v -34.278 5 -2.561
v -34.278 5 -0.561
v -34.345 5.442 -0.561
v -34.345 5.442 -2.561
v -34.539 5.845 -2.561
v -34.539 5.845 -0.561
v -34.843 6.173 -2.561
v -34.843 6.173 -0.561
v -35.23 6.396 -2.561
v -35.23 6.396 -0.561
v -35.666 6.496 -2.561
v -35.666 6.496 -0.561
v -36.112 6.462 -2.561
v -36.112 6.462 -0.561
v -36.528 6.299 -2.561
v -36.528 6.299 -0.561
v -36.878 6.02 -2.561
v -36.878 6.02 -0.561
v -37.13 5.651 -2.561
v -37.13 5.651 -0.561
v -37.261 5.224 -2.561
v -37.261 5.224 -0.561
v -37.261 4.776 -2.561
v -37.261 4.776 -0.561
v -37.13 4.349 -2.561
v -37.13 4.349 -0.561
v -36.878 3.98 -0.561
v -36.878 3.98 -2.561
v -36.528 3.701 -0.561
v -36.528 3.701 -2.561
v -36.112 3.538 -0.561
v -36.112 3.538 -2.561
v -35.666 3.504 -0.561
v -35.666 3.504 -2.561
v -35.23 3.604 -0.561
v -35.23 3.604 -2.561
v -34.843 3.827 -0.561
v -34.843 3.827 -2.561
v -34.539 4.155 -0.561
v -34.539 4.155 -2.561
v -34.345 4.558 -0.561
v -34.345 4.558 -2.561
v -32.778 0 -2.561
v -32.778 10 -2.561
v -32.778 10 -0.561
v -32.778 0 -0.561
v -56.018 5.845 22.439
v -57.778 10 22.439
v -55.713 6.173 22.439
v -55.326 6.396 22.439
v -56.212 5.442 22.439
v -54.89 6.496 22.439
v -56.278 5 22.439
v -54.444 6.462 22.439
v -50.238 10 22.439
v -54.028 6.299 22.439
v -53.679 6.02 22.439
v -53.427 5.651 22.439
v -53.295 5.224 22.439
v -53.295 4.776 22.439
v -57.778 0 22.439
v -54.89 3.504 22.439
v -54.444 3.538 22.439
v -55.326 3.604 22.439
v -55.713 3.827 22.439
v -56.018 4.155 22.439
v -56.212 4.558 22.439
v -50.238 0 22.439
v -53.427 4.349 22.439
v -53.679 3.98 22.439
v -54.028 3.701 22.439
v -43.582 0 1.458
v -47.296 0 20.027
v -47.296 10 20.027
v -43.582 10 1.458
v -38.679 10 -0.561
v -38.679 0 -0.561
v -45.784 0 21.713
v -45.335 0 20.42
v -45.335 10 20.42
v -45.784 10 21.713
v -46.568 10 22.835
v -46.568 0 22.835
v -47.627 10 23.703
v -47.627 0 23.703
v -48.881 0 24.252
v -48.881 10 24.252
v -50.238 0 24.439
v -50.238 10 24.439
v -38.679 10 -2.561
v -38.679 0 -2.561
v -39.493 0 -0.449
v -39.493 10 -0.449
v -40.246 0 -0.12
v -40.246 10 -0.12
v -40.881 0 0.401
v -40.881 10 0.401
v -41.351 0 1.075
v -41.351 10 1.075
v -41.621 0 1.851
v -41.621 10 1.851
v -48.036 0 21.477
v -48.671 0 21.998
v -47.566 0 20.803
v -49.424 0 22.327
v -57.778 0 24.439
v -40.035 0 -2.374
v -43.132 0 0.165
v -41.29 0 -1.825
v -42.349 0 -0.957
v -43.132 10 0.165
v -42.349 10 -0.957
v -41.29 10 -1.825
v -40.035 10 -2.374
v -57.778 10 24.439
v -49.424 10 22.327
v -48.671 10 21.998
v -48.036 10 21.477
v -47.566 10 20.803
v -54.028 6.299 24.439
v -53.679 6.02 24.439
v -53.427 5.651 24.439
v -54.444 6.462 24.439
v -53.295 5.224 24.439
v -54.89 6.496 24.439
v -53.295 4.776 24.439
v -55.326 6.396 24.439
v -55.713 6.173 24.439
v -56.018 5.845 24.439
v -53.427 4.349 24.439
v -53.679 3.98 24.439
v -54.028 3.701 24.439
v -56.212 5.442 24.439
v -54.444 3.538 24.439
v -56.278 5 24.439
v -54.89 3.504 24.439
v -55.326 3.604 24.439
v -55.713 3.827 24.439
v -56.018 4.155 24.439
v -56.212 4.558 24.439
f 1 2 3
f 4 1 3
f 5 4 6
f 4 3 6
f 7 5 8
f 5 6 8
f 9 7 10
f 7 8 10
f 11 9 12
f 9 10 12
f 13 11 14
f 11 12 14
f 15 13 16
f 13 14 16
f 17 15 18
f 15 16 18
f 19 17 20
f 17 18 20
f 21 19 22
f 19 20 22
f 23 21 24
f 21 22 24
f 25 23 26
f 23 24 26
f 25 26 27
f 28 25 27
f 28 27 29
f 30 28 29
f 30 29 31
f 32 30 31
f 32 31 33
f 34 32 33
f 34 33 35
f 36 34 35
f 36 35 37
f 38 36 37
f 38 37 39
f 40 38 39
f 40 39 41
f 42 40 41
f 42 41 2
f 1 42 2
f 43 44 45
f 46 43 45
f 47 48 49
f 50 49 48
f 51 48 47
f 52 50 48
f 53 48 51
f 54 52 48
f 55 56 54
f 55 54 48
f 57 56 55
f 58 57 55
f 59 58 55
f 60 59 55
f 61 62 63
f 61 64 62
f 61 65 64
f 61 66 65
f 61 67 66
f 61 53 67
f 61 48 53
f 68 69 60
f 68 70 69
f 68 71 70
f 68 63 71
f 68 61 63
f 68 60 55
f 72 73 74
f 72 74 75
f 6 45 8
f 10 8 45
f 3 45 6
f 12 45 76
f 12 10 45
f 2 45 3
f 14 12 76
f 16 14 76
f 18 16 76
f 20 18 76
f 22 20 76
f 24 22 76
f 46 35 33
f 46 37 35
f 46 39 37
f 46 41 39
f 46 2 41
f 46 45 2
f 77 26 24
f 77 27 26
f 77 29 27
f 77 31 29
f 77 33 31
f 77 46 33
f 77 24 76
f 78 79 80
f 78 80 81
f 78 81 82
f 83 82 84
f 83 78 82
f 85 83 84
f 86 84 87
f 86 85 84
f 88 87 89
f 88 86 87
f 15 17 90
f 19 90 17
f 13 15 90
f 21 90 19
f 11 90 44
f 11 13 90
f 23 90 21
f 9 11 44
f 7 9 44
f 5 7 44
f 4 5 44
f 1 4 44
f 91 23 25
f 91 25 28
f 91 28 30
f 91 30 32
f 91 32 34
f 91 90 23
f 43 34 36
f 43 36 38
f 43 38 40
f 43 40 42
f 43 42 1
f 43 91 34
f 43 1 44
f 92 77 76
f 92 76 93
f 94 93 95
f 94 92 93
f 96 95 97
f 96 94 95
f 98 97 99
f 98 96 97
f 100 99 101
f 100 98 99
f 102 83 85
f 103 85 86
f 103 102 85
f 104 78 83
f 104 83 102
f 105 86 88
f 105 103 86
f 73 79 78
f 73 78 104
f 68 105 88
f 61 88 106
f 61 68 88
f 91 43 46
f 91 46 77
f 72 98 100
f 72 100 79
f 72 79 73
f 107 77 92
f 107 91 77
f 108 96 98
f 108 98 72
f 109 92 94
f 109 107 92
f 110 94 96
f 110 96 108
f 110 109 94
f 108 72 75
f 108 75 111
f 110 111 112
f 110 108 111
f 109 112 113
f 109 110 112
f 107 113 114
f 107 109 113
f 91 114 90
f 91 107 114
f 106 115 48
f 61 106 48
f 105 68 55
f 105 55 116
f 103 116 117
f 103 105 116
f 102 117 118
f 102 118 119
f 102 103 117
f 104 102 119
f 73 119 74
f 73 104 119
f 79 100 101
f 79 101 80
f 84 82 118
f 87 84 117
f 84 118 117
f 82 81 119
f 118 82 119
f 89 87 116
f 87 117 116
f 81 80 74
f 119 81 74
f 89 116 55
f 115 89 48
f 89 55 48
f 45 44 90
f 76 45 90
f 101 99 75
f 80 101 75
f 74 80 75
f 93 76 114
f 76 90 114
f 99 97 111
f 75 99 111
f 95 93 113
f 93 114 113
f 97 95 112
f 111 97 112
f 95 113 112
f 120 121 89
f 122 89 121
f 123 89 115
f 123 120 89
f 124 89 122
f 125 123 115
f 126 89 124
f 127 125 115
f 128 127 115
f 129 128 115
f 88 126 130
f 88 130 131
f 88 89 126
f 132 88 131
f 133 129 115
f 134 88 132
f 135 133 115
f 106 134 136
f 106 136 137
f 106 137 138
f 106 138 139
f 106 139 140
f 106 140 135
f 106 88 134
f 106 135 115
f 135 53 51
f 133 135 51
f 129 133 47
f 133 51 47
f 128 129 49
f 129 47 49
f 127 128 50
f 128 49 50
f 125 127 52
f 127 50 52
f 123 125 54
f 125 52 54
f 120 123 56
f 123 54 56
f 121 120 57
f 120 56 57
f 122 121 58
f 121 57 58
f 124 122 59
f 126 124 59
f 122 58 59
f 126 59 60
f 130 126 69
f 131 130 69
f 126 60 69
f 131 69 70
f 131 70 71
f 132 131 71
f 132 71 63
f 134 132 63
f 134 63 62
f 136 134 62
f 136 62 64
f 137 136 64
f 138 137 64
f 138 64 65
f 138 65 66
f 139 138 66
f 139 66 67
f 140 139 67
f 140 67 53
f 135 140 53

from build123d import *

# Parameters (mm, degrees)
SM_BASE_FLANGE_1_DEPTH = 10
SKETCH_9_R             = 1.5
CUT_EXTRUDE_1_DEPTH    = 10
SKETCH_10_R            = 1.5
CUT_EXTRUDE_2_DEPTH    = 10


# Sheet-metal steps are written as plain solids
with BuildPart() as part:
    # 草图4 → 基体-法兰1 (new body)
    with BuildSketch(Plane(origin=(0, 0, 0), x_dir=(1, 0, 0), z_dir=(0, 1, 0))):
        with BuildLine():
            Line((-57.778209212, -22.439021502), (-50.237620921, -22.439021502))
            ThreePointArc((-50.237620921, -22.439021502), (-48.335654204, -21.759047926), (-47.295878894, -20.027369908))
            Line((-47.295878894, -20.027369908), (-43.582093077, -1.458440827))
            ThreePointArc((-43.582093077, -1.458440827), (-41.849134227, 1.427689204), (-38.679189699, 2.560978498))
            Line((-38.679189699, 2.560978498), (-32.778209212, 2.560978498))
            Line((-32.778209212, 2.560978498), (-32.778209212, 0.560978498))
            Line((-32.778209212, 0.560978498), (-38.679189699, 0.560978498))
            ThreePointArc((-38.679189699, 0.560978498), (-40.581156416, -0.118995078), (-41.620931726, -1.850673097))
            Line((-41.620931726, -1.850673097), (-45.334717542, -20.419602178))
            ThreePointArc((-45.334717542, -20.419602178), (-47.067676393, -23.305732209), (-50.237620921, -24.439021502))
            Line((-50.237620921, -24.439021502), (-57.778209212, -24.439021502))
            Line((-57.778209212, -24.439021502), (-57.778209212, -22.439021502))
        make_face()
    extrude(amount=SM_BASE_FLANGE_1_DEPTH)

    # 草图9 → 切除-拉伸1 (cut)
    with BuildSketch(Plane(origin=(0, 0, 22.439021502), x_dir=(-1, 0, 0), z_dir=(0, 0, -1))):
        with Locations((54.778209212, 5)):
            Circle(SKETCH_9_R)
    extrude(amount=-CUT_EXTRUDE_1_DEPTH, mode=Mode.SUBTRACT)

    # 草图10 → 切除-拉伸2 (cut)
    with BuildSketch(Plane.XY.offset(-0.560978498)):
        with Locations((-35.778209212, 5)):
            Circle(SKETCH_10_R)
    extrude(amount=-CUT_EXTRUDE_2_DEPTH, mode=Mode.SUBTRACT)


solid = part.part
